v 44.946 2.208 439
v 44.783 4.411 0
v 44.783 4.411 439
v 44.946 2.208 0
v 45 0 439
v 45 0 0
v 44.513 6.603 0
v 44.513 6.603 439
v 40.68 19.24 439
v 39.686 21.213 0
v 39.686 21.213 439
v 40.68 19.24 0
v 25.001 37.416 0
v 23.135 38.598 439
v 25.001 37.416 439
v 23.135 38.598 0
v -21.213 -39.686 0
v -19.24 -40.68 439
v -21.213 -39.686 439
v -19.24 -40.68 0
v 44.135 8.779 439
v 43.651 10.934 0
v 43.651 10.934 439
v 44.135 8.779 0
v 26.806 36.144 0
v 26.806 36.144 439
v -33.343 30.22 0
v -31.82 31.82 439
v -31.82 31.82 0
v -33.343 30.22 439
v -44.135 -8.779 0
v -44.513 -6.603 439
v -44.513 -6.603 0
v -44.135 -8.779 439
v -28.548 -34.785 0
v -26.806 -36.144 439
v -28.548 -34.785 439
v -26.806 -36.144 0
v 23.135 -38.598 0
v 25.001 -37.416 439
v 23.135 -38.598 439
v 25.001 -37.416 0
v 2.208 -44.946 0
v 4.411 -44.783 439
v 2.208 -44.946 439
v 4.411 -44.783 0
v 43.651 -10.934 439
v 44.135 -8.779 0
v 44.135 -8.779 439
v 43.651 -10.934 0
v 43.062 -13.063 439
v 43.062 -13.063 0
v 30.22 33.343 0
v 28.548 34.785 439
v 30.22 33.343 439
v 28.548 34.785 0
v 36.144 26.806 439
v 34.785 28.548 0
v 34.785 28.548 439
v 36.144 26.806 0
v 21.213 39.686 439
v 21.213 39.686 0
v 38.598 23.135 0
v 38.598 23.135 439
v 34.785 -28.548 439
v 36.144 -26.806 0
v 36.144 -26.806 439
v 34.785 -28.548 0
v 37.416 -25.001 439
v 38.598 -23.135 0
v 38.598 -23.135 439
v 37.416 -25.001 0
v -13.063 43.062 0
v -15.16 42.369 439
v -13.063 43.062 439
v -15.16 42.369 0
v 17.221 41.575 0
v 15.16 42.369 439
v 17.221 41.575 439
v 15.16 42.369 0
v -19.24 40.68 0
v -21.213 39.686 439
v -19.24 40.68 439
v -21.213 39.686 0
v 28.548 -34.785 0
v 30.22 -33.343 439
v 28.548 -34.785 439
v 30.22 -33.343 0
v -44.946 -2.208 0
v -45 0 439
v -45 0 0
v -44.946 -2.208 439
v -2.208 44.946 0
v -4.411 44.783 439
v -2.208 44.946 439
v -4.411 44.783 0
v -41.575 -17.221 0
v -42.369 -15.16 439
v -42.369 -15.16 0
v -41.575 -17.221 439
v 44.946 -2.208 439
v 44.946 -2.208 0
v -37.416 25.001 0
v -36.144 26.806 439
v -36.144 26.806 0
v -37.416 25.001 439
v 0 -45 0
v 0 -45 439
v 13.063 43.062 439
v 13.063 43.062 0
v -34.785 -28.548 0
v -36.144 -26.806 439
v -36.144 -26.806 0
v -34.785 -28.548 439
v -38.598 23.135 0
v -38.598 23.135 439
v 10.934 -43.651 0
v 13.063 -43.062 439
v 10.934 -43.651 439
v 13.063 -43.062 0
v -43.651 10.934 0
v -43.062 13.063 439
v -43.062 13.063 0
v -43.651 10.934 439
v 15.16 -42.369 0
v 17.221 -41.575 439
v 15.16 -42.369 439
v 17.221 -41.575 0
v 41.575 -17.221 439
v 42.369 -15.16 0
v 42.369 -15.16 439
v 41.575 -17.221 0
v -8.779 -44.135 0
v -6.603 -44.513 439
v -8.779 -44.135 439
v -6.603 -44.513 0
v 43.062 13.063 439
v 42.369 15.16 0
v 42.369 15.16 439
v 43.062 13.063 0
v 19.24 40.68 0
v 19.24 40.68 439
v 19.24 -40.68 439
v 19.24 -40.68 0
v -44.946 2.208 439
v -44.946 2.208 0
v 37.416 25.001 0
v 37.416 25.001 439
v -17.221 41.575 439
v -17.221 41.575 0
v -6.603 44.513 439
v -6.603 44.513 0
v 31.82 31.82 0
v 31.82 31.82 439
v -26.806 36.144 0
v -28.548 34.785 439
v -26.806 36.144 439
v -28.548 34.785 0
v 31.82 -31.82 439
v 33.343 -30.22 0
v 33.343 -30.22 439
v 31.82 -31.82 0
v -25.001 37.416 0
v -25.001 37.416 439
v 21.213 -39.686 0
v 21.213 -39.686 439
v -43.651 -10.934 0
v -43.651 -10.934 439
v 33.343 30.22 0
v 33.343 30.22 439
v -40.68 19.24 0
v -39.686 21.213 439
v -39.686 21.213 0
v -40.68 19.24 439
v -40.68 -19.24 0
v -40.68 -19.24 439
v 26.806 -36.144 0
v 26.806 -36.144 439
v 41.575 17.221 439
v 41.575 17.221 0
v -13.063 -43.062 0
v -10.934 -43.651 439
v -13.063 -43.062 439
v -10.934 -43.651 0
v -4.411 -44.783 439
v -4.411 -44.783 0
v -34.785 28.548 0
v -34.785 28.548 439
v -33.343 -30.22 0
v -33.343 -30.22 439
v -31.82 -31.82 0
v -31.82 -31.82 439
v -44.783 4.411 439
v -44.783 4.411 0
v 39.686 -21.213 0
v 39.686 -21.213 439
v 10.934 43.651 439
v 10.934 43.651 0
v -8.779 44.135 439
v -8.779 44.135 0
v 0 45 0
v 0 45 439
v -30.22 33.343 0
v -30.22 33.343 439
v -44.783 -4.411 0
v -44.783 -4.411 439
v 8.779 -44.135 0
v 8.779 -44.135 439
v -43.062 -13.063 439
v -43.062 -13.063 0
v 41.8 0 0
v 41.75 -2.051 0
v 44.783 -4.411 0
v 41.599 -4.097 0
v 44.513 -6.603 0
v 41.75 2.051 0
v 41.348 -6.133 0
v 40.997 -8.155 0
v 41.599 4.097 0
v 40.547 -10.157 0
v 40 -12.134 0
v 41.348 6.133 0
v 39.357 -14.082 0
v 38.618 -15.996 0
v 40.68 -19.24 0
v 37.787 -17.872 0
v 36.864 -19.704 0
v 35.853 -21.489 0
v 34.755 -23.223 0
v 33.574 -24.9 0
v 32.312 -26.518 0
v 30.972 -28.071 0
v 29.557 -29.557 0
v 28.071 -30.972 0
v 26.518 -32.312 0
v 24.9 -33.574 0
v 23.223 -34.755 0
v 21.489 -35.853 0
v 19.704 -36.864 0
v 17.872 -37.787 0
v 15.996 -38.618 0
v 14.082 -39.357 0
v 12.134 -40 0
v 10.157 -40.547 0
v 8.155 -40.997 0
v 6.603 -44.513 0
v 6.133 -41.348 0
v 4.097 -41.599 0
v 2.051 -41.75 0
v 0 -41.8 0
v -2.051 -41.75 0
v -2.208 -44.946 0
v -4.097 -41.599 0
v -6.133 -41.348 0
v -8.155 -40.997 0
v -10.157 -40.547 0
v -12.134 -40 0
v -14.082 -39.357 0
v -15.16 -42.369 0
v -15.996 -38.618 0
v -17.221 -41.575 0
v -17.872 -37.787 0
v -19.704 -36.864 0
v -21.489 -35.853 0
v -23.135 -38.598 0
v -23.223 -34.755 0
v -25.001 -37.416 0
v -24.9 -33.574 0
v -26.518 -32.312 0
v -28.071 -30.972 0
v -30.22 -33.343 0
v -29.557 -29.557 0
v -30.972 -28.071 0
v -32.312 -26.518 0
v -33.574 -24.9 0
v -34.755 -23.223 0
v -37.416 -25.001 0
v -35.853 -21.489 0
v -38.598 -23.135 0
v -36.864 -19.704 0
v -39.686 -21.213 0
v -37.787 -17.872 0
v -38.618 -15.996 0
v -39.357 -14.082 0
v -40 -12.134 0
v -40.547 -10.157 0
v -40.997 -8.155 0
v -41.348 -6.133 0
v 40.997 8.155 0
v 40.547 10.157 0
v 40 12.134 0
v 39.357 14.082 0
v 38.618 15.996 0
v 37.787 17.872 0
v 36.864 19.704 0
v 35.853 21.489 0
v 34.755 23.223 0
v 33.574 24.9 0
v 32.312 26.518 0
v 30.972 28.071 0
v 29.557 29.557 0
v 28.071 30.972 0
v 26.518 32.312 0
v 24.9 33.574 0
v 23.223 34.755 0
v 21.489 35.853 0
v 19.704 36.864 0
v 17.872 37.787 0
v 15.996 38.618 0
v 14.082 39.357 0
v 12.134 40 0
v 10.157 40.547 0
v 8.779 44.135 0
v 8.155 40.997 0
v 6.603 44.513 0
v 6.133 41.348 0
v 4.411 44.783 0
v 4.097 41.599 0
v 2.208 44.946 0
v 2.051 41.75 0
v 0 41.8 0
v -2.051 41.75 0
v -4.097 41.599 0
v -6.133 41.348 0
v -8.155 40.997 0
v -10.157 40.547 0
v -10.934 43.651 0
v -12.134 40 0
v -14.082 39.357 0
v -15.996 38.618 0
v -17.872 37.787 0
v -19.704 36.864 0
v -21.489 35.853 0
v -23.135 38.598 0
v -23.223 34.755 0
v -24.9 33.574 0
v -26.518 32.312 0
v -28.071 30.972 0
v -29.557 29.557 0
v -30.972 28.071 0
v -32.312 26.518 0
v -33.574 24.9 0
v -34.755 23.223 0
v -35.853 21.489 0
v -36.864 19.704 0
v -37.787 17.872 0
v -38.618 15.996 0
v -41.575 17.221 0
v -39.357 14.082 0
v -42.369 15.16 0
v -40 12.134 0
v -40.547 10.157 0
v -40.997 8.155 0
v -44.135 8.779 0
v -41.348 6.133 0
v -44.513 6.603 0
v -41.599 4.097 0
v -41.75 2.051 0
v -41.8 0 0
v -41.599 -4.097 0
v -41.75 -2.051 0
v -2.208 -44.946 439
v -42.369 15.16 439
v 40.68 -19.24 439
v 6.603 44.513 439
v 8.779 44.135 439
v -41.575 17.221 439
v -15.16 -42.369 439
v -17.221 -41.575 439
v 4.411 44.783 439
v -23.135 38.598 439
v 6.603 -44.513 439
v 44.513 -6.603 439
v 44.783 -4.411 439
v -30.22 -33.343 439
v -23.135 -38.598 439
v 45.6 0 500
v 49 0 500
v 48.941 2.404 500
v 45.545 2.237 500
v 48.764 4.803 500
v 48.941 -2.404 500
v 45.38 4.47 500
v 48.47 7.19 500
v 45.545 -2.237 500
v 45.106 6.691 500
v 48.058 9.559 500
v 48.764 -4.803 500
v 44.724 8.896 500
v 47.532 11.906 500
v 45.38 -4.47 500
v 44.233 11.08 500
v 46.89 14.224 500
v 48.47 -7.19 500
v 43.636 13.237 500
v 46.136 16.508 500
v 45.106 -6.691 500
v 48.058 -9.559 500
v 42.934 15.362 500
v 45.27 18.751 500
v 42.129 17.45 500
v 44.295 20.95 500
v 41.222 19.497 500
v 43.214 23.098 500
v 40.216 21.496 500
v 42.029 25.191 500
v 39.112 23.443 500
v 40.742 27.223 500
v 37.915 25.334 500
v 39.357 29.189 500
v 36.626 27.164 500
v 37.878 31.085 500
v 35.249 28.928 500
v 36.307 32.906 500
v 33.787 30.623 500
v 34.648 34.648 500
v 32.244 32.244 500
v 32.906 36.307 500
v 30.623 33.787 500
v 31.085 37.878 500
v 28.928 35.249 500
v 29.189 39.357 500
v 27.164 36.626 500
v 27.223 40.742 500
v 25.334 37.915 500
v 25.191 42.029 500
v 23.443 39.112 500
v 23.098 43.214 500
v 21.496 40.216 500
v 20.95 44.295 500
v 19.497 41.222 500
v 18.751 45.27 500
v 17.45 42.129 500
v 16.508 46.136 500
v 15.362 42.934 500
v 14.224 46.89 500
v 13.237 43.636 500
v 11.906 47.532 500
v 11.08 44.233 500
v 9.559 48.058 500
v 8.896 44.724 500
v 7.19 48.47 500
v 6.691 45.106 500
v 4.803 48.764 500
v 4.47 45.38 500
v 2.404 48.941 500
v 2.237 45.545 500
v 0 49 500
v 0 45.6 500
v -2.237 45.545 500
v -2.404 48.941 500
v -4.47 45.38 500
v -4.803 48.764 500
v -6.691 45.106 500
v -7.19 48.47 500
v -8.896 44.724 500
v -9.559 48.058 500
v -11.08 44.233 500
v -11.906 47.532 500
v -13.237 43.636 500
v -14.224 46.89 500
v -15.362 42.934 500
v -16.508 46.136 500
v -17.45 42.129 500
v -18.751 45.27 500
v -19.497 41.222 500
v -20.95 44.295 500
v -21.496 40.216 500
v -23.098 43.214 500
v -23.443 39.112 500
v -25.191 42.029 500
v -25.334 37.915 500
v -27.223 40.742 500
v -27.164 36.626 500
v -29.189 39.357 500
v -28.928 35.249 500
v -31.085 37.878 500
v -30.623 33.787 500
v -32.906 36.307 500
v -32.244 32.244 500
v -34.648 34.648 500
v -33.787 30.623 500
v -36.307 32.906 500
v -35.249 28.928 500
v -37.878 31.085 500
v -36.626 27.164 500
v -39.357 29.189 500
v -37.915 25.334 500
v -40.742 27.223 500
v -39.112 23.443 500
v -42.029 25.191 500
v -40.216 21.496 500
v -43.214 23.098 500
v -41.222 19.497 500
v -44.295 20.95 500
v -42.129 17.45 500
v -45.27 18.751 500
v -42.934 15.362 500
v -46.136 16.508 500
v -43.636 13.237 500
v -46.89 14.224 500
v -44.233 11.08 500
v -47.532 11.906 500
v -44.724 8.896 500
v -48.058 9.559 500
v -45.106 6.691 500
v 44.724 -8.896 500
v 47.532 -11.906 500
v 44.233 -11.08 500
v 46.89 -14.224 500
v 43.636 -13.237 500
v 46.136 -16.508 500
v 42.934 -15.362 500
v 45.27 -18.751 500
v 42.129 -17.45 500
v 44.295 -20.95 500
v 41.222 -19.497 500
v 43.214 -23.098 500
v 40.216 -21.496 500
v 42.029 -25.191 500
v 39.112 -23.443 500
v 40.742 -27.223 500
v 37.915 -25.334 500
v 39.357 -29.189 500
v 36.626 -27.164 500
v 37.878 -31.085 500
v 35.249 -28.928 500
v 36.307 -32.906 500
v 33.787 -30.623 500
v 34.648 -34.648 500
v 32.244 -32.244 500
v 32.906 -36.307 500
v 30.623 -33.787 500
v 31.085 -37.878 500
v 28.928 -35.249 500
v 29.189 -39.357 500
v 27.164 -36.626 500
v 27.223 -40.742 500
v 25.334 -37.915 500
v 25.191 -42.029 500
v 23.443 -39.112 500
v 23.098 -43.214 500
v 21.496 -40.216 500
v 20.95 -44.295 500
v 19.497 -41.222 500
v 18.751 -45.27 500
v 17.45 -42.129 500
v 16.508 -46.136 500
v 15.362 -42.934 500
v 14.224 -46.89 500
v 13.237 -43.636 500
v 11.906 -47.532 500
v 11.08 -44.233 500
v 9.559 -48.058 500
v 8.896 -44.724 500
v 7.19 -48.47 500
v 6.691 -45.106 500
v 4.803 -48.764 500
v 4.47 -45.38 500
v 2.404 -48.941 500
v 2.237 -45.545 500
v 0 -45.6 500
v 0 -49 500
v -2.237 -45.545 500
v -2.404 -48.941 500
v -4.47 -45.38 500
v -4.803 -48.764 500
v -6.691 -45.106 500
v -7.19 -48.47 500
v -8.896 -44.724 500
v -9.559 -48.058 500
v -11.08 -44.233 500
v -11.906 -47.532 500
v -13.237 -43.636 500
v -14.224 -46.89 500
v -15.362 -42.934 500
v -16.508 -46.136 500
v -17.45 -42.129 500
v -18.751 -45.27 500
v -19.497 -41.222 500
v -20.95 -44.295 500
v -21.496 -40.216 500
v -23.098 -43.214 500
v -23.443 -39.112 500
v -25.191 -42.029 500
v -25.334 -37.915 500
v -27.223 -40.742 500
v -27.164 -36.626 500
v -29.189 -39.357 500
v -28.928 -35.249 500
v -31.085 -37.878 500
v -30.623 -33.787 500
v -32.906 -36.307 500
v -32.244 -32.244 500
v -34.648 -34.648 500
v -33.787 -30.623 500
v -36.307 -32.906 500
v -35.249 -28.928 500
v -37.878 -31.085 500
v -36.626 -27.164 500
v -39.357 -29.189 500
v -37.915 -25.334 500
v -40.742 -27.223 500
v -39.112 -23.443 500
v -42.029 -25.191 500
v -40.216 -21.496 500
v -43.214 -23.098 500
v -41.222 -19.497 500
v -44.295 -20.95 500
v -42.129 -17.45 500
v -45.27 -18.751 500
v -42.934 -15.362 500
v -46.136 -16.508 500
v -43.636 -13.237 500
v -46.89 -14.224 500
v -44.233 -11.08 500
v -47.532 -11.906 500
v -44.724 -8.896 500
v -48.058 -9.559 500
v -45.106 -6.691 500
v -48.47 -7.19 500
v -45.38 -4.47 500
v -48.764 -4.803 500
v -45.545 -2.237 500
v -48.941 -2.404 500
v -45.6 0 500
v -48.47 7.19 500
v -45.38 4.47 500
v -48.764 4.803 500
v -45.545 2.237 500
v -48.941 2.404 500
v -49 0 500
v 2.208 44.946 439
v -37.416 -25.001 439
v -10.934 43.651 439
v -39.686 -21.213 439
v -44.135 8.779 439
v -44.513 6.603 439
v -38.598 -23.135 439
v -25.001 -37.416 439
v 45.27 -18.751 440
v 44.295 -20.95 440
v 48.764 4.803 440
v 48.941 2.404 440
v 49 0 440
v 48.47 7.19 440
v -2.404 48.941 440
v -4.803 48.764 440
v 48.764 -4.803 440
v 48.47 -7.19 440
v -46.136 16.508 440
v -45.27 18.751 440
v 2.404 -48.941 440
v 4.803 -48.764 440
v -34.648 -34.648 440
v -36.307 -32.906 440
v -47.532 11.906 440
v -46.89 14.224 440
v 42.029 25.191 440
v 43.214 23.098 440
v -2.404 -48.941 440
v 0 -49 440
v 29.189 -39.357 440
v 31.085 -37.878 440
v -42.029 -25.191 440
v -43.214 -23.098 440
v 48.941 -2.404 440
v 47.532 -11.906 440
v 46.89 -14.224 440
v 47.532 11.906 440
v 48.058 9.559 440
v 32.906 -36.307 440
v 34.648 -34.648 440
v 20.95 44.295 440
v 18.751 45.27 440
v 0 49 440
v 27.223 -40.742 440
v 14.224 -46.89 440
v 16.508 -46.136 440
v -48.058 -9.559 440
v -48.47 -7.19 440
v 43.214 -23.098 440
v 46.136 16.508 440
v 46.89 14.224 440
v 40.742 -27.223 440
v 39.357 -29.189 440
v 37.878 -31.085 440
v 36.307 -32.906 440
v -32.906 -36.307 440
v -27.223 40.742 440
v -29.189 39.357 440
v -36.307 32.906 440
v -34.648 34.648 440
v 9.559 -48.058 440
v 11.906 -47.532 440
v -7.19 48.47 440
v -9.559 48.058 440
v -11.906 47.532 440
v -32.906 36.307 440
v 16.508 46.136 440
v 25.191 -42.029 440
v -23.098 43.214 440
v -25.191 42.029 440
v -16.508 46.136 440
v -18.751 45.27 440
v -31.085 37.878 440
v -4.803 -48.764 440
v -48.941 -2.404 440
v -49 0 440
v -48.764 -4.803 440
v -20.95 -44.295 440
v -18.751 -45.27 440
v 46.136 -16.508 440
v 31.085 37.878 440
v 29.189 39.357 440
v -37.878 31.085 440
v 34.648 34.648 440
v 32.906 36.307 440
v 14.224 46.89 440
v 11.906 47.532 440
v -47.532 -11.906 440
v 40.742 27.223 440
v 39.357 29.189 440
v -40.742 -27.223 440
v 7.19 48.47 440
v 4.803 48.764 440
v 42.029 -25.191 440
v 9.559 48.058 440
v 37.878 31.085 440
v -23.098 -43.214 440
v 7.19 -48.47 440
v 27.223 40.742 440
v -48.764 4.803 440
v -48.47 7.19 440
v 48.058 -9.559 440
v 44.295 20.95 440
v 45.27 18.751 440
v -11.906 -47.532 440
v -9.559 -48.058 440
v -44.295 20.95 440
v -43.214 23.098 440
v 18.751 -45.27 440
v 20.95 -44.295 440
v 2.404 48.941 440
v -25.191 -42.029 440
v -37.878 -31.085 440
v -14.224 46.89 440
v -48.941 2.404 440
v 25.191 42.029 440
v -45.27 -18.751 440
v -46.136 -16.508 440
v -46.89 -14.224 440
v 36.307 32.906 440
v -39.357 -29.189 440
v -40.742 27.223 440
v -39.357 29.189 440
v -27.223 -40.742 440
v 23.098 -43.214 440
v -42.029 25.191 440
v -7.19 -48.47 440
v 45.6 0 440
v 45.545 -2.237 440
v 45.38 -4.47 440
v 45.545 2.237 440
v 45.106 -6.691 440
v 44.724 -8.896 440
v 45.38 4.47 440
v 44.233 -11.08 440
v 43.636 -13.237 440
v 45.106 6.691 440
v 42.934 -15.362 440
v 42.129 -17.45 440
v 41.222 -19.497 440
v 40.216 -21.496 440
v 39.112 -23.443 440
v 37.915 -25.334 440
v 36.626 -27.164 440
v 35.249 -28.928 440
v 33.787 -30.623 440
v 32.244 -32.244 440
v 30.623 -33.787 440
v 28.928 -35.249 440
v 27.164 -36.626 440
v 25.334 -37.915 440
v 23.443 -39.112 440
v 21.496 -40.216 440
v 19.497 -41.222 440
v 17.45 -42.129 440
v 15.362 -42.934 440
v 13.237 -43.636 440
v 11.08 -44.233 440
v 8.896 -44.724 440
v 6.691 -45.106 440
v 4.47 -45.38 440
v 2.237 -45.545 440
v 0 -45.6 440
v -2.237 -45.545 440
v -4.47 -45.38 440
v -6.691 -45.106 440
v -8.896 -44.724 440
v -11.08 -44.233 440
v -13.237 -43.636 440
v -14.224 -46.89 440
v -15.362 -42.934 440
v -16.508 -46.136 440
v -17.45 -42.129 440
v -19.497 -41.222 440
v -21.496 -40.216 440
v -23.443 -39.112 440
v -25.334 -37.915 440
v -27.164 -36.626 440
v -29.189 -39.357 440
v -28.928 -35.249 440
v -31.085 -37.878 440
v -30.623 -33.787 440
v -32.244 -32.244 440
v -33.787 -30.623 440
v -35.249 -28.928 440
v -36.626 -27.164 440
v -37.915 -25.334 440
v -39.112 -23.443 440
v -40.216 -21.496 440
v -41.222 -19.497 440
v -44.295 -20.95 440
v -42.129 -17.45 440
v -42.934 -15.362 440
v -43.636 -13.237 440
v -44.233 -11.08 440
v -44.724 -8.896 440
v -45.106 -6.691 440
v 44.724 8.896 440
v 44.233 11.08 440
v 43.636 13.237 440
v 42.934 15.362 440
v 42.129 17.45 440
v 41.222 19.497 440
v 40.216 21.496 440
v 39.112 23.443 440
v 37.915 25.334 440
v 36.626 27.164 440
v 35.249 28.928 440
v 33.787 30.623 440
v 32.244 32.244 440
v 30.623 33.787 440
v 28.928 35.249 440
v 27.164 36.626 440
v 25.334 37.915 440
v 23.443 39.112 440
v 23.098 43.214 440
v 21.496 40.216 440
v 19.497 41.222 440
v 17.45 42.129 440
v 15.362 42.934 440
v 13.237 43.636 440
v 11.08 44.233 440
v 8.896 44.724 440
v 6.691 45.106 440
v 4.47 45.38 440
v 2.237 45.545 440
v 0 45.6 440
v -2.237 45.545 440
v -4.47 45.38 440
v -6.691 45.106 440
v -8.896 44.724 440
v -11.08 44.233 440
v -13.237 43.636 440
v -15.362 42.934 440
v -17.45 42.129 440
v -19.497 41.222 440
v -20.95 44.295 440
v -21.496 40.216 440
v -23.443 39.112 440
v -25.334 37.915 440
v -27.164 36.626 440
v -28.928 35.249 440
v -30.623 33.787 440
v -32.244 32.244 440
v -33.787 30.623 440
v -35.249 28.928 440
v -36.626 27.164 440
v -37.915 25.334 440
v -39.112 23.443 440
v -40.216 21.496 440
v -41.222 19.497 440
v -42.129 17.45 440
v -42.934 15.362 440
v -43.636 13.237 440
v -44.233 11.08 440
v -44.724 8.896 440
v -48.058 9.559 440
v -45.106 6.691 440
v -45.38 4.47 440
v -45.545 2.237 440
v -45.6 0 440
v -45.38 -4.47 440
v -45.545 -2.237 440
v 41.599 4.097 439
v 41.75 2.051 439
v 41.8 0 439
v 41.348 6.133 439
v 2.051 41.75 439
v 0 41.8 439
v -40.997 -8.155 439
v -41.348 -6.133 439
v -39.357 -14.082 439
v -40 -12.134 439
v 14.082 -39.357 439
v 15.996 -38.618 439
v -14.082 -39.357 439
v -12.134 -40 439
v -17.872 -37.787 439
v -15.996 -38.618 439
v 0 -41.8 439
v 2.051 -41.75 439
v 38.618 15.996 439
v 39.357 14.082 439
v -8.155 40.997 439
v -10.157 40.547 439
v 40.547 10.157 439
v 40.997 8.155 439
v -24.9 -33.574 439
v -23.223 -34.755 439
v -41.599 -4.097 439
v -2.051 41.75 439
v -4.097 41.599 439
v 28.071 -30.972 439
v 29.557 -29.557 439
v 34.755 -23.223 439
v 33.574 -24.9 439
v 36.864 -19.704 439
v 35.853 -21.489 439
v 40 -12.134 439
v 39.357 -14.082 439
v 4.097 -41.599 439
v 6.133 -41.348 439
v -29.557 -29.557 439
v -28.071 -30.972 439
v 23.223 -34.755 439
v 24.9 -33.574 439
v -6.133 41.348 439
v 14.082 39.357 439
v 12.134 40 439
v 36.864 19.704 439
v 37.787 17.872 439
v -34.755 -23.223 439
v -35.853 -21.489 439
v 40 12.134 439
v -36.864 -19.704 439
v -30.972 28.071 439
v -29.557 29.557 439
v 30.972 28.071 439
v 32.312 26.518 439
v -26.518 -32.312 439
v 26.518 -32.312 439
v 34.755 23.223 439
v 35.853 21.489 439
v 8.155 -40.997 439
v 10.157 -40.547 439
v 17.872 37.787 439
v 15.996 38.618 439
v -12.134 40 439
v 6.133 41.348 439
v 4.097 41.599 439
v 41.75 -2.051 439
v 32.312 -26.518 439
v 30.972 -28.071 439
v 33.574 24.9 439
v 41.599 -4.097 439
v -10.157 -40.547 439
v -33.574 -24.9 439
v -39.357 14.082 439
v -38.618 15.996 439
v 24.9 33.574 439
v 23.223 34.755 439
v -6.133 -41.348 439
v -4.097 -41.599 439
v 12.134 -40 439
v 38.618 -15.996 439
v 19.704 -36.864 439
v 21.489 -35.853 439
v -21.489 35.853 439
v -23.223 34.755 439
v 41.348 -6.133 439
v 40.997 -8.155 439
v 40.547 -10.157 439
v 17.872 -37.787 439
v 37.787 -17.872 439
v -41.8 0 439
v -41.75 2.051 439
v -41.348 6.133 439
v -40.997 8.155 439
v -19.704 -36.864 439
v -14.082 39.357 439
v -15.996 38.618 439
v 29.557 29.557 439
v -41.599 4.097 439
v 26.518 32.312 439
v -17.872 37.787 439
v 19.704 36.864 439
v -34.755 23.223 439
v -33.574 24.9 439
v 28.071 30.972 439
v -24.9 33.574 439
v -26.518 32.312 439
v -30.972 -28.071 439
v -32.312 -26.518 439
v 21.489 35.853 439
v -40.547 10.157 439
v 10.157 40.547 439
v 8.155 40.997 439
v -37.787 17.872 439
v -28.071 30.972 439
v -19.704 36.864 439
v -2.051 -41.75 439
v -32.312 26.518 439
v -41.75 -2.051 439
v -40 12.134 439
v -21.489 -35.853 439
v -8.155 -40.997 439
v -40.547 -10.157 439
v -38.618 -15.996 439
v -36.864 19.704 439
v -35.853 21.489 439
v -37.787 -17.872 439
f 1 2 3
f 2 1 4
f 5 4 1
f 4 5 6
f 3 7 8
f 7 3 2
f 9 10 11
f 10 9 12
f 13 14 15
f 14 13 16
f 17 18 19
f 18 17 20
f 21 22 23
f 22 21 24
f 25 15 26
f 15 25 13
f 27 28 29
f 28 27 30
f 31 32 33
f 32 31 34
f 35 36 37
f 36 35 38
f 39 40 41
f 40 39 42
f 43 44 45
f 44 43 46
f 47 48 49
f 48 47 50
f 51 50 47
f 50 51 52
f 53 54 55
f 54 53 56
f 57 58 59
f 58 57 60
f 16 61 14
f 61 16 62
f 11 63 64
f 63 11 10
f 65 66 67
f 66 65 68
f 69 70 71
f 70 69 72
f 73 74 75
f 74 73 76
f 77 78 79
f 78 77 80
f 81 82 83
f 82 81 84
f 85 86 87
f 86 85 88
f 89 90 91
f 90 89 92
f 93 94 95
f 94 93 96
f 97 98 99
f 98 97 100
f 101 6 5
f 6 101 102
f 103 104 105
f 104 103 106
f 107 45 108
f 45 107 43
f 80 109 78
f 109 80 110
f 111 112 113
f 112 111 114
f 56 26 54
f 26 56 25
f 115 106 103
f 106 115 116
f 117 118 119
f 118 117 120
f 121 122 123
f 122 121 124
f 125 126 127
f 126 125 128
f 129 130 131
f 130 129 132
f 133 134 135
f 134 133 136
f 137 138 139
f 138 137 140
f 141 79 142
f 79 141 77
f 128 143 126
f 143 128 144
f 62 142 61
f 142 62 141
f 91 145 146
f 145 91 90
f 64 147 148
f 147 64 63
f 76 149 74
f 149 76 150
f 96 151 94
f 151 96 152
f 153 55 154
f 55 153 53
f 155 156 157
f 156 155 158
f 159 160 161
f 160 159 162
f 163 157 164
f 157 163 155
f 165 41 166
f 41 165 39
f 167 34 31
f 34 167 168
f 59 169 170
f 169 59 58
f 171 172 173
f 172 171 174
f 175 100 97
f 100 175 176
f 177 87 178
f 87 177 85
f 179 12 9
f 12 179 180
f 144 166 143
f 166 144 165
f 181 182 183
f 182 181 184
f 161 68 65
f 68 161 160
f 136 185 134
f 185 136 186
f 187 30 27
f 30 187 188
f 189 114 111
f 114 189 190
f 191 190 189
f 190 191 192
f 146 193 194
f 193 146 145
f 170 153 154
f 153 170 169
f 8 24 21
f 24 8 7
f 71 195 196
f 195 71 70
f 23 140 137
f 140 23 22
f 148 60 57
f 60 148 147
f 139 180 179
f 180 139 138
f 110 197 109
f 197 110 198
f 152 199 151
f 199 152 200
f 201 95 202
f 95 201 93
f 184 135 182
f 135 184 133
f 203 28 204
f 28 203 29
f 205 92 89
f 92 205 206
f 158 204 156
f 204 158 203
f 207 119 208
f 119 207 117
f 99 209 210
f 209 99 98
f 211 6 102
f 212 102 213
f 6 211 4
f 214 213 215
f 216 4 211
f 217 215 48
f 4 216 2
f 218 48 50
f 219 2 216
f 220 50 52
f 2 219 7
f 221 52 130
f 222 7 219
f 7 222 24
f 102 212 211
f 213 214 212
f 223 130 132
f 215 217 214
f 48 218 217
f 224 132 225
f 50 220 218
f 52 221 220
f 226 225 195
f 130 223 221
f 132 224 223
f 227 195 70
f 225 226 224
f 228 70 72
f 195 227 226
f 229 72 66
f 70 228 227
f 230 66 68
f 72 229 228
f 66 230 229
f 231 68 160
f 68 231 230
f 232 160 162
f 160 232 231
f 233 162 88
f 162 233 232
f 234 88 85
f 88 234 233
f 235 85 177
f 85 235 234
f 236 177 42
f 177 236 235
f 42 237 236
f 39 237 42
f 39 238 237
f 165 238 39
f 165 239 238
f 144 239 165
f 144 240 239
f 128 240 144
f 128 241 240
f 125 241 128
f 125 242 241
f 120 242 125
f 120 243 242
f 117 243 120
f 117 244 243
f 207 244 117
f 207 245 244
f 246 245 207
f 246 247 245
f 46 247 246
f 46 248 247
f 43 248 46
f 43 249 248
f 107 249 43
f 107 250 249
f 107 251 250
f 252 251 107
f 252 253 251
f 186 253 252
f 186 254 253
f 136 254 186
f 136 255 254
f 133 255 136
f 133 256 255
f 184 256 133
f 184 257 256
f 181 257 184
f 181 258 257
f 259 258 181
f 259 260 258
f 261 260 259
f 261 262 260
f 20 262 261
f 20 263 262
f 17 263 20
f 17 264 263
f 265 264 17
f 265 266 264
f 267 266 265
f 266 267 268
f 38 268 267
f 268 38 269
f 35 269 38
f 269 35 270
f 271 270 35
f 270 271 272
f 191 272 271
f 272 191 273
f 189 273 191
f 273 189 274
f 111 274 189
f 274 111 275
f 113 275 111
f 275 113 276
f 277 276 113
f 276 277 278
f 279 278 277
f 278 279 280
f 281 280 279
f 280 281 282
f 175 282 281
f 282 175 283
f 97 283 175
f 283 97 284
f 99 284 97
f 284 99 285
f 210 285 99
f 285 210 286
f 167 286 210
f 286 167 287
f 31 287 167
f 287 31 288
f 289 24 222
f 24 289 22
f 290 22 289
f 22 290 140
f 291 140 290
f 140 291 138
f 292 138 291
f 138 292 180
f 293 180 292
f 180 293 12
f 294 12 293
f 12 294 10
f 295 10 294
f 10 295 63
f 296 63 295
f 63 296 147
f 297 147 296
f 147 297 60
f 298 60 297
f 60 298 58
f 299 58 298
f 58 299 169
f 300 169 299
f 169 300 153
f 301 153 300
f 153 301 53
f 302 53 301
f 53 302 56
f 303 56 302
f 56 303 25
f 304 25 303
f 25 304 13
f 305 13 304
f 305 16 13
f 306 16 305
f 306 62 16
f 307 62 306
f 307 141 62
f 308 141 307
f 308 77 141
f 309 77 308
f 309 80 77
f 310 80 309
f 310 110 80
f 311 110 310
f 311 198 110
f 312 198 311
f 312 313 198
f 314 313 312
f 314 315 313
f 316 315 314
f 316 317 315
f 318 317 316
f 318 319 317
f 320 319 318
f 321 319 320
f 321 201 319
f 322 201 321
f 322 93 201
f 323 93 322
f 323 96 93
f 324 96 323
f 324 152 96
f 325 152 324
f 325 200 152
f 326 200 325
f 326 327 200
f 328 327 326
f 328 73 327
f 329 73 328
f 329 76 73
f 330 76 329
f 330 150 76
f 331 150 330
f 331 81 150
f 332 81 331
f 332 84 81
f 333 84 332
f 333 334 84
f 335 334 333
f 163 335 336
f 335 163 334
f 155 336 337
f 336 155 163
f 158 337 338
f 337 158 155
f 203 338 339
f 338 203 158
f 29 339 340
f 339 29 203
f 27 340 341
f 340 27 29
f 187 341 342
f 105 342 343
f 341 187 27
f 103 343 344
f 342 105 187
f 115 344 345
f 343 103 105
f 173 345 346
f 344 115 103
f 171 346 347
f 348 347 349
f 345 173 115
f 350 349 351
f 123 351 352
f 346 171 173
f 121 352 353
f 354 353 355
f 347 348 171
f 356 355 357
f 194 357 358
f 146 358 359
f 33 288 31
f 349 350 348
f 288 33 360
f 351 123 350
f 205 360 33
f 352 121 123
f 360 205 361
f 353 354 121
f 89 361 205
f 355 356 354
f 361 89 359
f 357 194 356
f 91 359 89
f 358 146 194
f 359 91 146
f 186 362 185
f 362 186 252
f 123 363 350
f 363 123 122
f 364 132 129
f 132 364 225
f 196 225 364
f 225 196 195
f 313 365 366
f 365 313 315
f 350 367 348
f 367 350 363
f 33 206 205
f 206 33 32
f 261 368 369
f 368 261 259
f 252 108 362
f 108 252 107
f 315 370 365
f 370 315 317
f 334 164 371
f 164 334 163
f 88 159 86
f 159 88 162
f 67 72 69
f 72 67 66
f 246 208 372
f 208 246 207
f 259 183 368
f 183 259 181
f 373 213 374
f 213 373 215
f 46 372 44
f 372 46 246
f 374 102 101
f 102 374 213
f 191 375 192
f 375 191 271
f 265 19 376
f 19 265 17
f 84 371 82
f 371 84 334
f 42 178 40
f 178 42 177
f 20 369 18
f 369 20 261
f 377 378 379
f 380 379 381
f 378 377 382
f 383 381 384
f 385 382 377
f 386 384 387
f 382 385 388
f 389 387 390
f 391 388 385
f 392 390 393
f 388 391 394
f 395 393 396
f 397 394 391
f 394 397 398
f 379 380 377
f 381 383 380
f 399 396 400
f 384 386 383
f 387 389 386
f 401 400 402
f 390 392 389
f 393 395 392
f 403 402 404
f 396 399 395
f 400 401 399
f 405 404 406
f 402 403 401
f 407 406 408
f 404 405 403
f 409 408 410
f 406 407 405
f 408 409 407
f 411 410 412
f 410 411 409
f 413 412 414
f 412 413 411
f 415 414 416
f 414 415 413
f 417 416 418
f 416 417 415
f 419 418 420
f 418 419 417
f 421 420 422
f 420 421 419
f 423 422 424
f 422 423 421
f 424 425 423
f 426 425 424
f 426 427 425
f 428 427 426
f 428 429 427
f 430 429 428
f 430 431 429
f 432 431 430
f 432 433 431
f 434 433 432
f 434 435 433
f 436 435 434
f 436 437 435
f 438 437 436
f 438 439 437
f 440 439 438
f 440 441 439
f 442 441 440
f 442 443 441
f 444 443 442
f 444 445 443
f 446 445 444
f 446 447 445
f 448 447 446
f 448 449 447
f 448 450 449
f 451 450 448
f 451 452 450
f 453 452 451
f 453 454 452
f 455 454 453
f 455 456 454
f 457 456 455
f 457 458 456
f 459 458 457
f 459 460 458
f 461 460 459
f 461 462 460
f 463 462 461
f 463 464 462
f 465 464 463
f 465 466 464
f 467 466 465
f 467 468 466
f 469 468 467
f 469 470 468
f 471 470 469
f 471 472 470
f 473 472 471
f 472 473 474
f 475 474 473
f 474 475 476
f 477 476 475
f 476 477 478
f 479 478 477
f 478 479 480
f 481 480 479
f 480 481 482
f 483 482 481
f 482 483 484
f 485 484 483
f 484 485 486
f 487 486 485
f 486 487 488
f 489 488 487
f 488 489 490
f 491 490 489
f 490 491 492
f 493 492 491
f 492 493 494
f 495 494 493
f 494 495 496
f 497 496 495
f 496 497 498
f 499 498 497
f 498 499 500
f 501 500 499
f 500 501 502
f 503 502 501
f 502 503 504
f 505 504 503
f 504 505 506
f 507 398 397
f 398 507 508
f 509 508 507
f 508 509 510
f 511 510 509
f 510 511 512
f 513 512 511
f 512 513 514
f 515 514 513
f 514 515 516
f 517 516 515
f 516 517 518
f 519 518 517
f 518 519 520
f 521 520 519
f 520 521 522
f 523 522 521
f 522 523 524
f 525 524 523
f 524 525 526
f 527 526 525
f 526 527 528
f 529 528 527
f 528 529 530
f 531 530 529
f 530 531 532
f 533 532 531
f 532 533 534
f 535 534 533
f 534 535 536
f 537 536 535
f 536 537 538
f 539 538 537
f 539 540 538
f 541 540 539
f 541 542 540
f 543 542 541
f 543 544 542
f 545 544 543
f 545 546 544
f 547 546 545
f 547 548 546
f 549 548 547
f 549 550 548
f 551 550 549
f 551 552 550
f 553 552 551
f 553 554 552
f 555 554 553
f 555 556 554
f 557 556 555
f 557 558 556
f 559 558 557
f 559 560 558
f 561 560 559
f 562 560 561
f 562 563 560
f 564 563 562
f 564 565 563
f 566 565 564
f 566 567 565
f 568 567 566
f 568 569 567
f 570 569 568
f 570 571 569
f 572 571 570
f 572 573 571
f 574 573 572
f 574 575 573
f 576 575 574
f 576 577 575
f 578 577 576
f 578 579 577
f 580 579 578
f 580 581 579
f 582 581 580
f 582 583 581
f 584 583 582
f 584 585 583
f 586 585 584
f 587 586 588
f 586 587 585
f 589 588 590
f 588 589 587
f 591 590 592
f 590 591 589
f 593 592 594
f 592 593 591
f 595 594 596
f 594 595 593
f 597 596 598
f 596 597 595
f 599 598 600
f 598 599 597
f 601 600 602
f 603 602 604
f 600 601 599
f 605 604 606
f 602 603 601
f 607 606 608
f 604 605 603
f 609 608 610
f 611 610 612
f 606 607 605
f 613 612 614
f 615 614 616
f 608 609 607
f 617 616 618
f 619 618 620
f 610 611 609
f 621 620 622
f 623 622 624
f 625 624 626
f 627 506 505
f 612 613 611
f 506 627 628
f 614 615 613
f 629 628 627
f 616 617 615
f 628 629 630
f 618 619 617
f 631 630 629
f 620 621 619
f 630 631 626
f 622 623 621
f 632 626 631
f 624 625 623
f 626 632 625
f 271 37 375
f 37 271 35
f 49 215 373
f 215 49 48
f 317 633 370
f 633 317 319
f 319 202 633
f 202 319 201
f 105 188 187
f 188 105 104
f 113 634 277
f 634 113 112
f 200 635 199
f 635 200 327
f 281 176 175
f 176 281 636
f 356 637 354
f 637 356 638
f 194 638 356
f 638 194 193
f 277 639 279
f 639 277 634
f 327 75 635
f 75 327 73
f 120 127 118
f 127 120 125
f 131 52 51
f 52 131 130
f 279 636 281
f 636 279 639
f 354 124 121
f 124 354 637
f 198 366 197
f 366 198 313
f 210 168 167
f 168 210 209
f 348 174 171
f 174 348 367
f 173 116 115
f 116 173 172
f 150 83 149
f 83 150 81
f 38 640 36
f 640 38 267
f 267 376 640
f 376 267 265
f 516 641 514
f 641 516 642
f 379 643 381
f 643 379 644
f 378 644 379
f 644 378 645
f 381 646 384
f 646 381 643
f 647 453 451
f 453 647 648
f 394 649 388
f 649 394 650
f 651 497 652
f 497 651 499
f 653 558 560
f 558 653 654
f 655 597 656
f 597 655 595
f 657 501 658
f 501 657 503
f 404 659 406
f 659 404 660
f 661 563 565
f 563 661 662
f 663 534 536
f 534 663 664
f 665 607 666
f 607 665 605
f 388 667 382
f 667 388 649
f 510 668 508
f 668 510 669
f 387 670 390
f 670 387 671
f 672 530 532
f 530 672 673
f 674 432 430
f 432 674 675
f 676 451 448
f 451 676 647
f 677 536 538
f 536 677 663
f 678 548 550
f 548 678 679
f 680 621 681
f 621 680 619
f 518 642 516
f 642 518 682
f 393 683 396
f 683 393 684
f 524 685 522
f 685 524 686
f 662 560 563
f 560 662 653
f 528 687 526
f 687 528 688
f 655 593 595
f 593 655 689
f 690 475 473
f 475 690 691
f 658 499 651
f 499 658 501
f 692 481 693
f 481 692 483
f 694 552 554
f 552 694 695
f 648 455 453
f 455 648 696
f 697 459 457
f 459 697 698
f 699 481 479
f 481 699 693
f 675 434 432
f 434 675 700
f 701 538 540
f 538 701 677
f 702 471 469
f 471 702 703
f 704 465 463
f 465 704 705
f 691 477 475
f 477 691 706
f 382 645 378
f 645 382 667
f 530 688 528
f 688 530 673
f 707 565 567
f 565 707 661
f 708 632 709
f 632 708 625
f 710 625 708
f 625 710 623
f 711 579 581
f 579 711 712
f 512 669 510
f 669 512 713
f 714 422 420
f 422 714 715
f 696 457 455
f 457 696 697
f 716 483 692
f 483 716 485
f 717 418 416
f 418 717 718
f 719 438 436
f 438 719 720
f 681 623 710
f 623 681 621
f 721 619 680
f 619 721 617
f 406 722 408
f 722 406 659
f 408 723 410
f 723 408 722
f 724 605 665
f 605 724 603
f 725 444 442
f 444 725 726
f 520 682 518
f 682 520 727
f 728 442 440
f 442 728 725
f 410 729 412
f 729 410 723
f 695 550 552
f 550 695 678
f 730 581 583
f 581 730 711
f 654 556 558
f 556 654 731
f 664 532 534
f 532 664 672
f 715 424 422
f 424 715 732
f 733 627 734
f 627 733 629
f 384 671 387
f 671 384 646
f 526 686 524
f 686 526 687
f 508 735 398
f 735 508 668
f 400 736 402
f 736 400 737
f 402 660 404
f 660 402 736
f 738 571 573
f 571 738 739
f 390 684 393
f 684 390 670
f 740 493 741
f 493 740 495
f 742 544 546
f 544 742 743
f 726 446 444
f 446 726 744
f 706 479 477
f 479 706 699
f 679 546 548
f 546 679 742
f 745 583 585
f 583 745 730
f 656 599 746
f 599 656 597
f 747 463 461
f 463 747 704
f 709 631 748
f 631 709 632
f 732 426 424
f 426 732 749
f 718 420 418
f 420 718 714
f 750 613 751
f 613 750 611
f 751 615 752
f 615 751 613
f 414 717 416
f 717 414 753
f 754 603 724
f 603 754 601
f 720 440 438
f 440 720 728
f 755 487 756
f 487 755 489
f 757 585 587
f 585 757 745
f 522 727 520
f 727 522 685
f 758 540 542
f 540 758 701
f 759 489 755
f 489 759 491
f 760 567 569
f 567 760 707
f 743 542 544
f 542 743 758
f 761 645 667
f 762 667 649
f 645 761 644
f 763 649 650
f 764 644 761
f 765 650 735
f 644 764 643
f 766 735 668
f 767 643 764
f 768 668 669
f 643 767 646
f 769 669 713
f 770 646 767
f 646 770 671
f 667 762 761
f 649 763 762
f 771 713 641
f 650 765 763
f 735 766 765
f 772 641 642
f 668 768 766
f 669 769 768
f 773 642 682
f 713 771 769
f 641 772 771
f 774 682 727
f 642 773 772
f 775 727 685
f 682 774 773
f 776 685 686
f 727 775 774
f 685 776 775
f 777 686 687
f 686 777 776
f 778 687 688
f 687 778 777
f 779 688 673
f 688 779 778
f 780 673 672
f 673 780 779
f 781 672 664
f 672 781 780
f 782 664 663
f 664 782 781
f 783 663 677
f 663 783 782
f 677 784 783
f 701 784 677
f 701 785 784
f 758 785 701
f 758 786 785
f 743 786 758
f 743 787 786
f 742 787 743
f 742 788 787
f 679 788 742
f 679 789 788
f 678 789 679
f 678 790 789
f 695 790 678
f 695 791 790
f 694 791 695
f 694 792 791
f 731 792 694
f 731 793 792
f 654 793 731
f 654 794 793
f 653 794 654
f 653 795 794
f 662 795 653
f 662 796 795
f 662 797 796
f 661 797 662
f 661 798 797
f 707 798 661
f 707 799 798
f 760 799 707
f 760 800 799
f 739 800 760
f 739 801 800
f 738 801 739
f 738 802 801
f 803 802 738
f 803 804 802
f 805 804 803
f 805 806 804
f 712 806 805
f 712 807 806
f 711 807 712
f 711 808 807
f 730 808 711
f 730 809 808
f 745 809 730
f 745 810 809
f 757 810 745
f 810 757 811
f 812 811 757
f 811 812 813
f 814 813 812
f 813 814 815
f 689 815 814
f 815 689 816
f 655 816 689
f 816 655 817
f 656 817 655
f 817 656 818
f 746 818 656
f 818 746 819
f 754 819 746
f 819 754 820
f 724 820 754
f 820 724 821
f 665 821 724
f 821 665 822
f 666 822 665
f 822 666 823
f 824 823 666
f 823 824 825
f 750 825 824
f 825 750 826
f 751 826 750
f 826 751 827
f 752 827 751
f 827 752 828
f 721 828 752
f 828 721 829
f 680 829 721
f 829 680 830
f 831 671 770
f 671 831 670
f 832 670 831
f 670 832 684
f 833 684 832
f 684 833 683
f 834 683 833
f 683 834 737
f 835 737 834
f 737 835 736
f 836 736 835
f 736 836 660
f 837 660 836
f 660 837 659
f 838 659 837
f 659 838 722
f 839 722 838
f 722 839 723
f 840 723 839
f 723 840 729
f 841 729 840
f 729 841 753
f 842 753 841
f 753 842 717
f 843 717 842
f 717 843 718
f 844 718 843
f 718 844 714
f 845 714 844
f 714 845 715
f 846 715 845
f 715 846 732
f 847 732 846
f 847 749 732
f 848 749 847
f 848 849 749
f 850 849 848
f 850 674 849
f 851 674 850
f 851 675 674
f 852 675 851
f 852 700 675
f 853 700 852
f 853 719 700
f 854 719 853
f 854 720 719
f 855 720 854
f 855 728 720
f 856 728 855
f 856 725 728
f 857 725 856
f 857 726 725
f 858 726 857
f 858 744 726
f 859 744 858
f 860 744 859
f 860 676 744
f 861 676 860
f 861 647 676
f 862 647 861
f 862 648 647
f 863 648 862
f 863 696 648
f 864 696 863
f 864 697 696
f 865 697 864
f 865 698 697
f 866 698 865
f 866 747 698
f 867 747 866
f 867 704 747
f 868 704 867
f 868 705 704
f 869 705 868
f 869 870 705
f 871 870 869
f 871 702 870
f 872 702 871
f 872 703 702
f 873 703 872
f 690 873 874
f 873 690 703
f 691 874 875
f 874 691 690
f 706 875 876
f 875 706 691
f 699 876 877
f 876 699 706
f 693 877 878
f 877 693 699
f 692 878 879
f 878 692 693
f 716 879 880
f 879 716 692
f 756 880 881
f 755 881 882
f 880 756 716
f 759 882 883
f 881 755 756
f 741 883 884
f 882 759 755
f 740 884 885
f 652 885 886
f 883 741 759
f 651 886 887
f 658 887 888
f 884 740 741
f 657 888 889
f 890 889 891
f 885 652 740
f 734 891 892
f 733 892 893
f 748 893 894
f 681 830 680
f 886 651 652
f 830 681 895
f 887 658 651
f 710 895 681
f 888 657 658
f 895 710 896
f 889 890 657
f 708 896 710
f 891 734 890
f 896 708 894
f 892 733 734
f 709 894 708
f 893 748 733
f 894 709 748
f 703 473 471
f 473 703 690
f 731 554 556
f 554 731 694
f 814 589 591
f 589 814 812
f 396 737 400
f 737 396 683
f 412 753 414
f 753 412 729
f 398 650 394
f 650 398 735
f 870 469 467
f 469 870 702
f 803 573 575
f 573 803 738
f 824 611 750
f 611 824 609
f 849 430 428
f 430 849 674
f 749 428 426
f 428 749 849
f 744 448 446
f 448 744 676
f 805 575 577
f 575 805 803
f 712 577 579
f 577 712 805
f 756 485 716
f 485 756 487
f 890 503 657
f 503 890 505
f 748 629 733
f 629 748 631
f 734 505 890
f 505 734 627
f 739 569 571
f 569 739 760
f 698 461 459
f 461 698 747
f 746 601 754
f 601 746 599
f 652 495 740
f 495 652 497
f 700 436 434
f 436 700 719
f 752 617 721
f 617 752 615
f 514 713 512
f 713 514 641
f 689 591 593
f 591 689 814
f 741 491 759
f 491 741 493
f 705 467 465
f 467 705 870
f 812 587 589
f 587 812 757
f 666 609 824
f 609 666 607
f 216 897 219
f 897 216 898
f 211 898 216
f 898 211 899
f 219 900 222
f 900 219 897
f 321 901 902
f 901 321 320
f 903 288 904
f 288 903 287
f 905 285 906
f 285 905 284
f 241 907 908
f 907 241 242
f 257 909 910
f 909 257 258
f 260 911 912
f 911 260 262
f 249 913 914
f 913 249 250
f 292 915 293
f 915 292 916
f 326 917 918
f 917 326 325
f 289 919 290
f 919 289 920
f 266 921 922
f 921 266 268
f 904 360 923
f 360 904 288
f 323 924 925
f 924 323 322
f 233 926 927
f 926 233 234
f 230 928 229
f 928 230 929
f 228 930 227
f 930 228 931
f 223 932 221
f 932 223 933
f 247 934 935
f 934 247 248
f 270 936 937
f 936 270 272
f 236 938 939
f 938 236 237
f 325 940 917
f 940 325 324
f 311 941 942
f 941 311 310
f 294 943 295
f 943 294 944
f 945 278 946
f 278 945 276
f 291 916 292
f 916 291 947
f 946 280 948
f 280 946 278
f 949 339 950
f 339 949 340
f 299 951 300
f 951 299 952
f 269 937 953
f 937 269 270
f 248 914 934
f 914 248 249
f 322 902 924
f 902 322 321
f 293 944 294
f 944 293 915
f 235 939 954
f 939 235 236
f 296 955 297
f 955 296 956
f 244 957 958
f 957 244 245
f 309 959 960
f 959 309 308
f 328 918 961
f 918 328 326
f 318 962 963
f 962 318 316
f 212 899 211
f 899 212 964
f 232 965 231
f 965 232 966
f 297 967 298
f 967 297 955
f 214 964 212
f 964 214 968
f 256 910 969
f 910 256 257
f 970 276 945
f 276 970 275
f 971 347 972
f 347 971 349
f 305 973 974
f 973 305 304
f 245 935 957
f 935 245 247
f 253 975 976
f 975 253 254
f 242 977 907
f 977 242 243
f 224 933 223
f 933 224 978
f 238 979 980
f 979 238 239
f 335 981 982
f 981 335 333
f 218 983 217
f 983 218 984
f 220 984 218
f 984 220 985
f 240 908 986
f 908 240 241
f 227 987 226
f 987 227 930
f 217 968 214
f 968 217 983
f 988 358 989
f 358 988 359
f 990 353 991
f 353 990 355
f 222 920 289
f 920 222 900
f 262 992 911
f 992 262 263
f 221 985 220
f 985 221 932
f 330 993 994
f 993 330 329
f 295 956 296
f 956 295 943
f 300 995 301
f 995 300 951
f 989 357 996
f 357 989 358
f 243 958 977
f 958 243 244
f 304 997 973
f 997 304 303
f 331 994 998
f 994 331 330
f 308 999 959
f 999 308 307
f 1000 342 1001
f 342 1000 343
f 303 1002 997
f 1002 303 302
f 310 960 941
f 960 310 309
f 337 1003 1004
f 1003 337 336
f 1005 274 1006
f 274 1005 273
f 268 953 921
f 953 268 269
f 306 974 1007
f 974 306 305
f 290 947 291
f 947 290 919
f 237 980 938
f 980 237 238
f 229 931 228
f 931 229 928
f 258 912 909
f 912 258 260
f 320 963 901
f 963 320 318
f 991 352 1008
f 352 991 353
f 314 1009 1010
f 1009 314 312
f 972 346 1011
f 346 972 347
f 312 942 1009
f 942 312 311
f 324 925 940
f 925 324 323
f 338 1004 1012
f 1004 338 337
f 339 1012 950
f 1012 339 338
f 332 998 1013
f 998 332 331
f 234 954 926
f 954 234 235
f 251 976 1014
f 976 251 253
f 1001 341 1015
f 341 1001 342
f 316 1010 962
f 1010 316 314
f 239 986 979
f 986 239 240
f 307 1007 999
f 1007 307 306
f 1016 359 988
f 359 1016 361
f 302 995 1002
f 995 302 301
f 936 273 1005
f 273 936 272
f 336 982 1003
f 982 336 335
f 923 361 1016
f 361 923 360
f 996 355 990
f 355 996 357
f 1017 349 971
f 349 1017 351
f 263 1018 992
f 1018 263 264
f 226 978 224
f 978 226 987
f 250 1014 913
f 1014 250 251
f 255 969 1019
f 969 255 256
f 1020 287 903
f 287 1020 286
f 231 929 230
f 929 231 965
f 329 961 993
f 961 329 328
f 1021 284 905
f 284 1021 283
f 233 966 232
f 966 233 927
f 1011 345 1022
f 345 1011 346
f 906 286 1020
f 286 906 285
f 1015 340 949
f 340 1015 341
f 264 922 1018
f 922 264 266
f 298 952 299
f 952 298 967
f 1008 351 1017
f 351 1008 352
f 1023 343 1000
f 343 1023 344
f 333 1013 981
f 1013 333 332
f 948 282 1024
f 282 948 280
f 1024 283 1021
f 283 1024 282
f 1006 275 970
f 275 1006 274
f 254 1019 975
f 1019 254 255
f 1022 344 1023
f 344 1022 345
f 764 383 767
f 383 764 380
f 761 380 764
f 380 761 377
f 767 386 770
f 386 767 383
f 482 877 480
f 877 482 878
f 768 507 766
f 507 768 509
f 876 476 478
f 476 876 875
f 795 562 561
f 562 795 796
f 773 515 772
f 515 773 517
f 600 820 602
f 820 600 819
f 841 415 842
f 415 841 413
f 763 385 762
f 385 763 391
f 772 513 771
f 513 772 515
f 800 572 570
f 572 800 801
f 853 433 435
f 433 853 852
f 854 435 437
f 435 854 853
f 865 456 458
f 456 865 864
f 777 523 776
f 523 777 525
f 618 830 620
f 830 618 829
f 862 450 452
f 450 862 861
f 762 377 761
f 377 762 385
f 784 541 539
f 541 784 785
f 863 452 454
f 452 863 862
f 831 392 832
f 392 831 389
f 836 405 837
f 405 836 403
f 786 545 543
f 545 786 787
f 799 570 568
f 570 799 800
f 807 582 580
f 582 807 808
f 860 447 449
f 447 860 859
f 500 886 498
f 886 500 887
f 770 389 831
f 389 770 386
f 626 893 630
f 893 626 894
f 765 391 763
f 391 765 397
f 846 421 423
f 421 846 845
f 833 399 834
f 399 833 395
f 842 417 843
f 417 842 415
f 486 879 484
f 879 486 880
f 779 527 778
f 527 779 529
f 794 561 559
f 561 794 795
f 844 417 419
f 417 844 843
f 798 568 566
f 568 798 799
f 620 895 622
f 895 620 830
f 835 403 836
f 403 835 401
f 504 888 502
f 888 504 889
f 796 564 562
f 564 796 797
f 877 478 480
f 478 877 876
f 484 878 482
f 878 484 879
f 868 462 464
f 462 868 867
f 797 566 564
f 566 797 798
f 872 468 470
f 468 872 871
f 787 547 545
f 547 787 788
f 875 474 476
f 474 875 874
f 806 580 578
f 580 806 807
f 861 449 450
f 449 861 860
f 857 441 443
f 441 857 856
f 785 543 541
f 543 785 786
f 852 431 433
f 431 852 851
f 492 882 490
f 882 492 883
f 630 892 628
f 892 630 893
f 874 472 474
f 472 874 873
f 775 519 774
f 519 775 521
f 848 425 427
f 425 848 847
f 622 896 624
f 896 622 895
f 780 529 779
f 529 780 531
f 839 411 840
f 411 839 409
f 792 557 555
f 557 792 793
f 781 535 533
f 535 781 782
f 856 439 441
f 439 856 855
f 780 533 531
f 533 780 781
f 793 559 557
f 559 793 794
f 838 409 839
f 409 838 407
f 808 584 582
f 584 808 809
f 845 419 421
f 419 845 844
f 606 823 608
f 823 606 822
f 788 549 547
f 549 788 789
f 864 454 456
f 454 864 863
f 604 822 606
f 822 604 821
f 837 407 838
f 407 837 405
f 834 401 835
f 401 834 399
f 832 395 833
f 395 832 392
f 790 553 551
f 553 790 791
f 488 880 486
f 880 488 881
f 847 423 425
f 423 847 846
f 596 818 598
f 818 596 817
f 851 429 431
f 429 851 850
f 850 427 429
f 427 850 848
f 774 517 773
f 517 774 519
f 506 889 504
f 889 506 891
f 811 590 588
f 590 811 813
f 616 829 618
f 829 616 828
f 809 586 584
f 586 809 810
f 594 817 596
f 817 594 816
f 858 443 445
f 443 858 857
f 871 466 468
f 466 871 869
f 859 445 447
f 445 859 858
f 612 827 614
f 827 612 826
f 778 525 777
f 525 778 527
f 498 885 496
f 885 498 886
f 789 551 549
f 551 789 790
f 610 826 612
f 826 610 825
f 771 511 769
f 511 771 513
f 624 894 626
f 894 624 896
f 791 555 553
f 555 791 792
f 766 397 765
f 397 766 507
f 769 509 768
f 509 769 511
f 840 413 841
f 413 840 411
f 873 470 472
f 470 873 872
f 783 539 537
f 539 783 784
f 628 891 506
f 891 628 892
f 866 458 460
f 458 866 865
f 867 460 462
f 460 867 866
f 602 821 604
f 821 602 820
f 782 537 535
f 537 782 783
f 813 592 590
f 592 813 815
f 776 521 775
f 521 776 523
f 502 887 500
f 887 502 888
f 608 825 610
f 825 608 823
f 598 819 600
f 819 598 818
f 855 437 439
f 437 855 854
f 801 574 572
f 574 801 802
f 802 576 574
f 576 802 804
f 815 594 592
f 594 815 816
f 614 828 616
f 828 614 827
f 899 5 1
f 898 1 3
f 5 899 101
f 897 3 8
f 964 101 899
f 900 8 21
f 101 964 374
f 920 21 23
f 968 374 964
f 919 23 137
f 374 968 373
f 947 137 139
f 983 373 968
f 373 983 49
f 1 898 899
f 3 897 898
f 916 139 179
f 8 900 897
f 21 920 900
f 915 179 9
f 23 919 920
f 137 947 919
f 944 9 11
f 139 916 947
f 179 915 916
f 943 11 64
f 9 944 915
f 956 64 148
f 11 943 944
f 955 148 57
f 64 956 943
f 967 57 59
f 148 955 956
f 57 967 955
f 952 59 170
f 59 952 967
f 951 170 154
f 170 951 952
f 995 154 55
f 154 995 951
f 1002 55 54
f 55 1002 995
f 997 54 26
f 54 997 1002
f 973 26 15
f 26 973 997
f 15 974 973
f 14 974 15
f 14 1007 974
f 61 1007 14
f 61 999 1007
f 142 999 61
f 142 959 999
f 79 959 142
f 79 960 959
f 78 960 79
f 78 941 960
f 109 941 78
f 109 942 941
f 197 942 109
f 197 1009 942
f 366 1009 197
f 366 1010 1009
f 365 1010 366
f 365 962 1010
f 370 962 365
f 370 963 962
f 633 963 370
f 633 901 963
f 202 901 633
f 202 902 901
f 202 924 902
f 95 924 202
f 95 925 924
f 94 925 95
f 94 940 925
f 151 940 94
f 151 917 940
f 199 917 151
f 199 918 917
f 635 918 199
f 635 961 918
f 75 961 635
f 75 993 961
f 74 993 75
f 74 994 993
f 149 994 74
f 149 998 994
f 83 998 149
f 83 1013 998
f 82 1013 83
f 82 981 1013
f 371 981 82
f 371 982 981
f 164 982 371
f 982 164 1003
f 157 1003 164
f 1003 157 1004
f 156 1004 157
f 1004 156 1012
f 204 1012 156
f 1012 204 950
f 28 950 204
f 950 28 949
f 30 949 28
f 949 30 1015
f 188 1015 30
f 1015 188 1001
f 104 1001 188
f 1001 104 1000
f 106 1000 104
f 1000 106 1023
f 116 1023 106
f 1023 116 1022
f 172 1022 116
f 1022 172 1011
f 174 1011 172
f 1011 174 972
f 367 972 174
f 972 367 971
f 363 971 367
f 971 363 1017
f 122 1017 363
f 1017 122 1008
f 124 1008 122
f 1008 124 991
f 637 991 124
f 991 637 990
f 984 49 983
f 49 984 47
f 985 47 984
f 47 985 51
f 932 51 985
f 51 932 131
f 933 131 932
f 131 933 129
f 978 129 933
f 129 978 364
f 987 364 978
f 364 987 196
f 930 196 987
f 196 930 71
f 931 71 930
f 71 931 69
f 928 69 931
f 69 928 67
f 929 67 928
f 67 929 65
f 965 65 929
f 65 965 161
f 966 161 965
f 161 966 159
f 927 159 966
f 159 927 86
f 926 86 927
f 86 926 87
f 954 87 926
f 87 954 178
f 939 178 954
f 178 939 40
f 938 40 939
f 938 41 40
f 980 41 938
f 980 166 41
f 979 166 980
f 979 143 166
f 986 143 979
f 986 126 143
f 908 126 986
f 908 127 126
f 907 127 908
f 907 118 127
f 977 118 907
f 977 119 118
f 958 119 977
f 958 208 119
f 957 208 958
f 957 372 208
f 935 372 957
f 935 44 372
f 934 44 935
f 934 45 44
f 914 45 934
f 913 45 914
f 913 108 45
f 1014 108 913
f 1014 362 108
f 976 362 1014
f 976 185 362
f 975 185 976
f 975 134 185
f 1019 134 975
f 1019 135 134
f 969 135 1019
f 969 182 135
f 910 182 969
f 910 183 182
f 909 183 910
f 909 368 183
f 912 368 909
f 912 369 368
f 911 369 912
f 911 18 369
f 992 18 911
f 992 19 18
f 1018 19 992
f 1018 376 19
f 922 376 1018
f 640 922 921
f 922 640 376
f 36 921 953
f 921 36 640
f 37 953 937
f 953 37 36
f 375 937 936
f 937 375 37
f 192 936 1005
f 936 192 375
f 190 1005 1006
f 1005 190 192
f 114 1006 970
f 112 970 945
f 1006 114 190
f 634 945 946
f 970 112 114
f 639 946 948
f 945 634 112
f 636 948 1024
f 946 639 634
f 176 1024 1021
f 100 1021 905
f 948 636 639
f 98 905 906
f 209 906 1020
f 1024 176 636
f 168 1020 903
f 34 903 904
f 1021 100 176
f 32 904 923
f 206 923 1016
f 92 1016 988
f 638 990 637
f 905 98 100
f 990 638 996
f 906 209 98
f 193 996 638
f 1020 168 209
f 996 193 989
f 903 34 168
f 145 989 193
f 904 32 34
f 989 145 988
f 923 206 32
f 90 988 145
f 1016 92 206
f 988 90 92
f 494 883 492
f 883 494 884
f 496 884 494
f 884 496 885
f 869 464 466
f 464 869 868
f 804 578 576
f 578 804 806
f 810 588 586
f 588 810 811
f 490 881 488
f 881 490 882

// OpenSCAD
$fn = 128;

// Parameters
nominal_size = 90; //[50:180:1]
length_mm = 500; //[250:1000:1]
include_end_fitting = 1; //[0:1:1]
center = 0; //[0:1:1]

pipe_od = 90; //[45:180:1]
wall_thickness = 3.2; //[1.6:6.4:0.1]

socket_od = 98; //[80:140:0.5]
socket_length = 60; //[30:120:1]
socket_wall_extra = 1.8; //[0.8:4:0.1]
socket_bore_clearance = 0.6; //[0.2:1.5:0.1]

overlap = 1; //[0.5:2:0.1]

// Derived
pipe_r = pipe_od/2;
pipe_ir = pipe_r - wall_thickness;

socket_r = socket_od/2;
socket_ir = pipe_r + socket_bore_clearance;

// Safety clamps
pipe_ir_safe   = max(0.01, pipe_ir);
socket_ir_safe = max(0.01, socket_ir);
socket_r_safe  = max(socket_ir_safe + 0.01, socket_r);

// Ensure socket doesn't exceed pipe length
socket_len_safe = min(socket_length, length_mm);

// Place socket at the "top" end (z = length_mm - socket_len_safe ... length_mm)
socket_z0 = length_mm - socket_len_safe;

module ht90_pipe_500() {
    color([0.85, 0.85, 0.8])
    difference() {
        union() {
            // Main outer pipe
            cylinder(h=length_mm, r=pipe_r, center=false);

            // Socket outer (connected by construction)
            if (include_end_fitting && socket_len_safe > 0)
                translate([0, 0, socket_z0])
                    cylinder(h=socket_len_safe, r=socket_r_safe, center=false);
        }

        // Main bore (hollow) - slightly extended for robust boolean
        translate([0, 0, -overlap])
            cylinder(h=length_mm + 2*overlap, r=pipe_ir_safe, center=false);

        // Socket bore (slightly larger ID inside socket region) - extended for robust boolean
        if (include_end_fitting && socket_len_safe > 0)
            translate([0, 0, socket_z0 - overlap])
                cylinder(h=socket_len_safe + 2*overlap, r=socket_ir_safe, center=false);
    }
}

// Centering option
translate([0, 0, -center*(length_mm/2)]) ht90_pipe_500();
